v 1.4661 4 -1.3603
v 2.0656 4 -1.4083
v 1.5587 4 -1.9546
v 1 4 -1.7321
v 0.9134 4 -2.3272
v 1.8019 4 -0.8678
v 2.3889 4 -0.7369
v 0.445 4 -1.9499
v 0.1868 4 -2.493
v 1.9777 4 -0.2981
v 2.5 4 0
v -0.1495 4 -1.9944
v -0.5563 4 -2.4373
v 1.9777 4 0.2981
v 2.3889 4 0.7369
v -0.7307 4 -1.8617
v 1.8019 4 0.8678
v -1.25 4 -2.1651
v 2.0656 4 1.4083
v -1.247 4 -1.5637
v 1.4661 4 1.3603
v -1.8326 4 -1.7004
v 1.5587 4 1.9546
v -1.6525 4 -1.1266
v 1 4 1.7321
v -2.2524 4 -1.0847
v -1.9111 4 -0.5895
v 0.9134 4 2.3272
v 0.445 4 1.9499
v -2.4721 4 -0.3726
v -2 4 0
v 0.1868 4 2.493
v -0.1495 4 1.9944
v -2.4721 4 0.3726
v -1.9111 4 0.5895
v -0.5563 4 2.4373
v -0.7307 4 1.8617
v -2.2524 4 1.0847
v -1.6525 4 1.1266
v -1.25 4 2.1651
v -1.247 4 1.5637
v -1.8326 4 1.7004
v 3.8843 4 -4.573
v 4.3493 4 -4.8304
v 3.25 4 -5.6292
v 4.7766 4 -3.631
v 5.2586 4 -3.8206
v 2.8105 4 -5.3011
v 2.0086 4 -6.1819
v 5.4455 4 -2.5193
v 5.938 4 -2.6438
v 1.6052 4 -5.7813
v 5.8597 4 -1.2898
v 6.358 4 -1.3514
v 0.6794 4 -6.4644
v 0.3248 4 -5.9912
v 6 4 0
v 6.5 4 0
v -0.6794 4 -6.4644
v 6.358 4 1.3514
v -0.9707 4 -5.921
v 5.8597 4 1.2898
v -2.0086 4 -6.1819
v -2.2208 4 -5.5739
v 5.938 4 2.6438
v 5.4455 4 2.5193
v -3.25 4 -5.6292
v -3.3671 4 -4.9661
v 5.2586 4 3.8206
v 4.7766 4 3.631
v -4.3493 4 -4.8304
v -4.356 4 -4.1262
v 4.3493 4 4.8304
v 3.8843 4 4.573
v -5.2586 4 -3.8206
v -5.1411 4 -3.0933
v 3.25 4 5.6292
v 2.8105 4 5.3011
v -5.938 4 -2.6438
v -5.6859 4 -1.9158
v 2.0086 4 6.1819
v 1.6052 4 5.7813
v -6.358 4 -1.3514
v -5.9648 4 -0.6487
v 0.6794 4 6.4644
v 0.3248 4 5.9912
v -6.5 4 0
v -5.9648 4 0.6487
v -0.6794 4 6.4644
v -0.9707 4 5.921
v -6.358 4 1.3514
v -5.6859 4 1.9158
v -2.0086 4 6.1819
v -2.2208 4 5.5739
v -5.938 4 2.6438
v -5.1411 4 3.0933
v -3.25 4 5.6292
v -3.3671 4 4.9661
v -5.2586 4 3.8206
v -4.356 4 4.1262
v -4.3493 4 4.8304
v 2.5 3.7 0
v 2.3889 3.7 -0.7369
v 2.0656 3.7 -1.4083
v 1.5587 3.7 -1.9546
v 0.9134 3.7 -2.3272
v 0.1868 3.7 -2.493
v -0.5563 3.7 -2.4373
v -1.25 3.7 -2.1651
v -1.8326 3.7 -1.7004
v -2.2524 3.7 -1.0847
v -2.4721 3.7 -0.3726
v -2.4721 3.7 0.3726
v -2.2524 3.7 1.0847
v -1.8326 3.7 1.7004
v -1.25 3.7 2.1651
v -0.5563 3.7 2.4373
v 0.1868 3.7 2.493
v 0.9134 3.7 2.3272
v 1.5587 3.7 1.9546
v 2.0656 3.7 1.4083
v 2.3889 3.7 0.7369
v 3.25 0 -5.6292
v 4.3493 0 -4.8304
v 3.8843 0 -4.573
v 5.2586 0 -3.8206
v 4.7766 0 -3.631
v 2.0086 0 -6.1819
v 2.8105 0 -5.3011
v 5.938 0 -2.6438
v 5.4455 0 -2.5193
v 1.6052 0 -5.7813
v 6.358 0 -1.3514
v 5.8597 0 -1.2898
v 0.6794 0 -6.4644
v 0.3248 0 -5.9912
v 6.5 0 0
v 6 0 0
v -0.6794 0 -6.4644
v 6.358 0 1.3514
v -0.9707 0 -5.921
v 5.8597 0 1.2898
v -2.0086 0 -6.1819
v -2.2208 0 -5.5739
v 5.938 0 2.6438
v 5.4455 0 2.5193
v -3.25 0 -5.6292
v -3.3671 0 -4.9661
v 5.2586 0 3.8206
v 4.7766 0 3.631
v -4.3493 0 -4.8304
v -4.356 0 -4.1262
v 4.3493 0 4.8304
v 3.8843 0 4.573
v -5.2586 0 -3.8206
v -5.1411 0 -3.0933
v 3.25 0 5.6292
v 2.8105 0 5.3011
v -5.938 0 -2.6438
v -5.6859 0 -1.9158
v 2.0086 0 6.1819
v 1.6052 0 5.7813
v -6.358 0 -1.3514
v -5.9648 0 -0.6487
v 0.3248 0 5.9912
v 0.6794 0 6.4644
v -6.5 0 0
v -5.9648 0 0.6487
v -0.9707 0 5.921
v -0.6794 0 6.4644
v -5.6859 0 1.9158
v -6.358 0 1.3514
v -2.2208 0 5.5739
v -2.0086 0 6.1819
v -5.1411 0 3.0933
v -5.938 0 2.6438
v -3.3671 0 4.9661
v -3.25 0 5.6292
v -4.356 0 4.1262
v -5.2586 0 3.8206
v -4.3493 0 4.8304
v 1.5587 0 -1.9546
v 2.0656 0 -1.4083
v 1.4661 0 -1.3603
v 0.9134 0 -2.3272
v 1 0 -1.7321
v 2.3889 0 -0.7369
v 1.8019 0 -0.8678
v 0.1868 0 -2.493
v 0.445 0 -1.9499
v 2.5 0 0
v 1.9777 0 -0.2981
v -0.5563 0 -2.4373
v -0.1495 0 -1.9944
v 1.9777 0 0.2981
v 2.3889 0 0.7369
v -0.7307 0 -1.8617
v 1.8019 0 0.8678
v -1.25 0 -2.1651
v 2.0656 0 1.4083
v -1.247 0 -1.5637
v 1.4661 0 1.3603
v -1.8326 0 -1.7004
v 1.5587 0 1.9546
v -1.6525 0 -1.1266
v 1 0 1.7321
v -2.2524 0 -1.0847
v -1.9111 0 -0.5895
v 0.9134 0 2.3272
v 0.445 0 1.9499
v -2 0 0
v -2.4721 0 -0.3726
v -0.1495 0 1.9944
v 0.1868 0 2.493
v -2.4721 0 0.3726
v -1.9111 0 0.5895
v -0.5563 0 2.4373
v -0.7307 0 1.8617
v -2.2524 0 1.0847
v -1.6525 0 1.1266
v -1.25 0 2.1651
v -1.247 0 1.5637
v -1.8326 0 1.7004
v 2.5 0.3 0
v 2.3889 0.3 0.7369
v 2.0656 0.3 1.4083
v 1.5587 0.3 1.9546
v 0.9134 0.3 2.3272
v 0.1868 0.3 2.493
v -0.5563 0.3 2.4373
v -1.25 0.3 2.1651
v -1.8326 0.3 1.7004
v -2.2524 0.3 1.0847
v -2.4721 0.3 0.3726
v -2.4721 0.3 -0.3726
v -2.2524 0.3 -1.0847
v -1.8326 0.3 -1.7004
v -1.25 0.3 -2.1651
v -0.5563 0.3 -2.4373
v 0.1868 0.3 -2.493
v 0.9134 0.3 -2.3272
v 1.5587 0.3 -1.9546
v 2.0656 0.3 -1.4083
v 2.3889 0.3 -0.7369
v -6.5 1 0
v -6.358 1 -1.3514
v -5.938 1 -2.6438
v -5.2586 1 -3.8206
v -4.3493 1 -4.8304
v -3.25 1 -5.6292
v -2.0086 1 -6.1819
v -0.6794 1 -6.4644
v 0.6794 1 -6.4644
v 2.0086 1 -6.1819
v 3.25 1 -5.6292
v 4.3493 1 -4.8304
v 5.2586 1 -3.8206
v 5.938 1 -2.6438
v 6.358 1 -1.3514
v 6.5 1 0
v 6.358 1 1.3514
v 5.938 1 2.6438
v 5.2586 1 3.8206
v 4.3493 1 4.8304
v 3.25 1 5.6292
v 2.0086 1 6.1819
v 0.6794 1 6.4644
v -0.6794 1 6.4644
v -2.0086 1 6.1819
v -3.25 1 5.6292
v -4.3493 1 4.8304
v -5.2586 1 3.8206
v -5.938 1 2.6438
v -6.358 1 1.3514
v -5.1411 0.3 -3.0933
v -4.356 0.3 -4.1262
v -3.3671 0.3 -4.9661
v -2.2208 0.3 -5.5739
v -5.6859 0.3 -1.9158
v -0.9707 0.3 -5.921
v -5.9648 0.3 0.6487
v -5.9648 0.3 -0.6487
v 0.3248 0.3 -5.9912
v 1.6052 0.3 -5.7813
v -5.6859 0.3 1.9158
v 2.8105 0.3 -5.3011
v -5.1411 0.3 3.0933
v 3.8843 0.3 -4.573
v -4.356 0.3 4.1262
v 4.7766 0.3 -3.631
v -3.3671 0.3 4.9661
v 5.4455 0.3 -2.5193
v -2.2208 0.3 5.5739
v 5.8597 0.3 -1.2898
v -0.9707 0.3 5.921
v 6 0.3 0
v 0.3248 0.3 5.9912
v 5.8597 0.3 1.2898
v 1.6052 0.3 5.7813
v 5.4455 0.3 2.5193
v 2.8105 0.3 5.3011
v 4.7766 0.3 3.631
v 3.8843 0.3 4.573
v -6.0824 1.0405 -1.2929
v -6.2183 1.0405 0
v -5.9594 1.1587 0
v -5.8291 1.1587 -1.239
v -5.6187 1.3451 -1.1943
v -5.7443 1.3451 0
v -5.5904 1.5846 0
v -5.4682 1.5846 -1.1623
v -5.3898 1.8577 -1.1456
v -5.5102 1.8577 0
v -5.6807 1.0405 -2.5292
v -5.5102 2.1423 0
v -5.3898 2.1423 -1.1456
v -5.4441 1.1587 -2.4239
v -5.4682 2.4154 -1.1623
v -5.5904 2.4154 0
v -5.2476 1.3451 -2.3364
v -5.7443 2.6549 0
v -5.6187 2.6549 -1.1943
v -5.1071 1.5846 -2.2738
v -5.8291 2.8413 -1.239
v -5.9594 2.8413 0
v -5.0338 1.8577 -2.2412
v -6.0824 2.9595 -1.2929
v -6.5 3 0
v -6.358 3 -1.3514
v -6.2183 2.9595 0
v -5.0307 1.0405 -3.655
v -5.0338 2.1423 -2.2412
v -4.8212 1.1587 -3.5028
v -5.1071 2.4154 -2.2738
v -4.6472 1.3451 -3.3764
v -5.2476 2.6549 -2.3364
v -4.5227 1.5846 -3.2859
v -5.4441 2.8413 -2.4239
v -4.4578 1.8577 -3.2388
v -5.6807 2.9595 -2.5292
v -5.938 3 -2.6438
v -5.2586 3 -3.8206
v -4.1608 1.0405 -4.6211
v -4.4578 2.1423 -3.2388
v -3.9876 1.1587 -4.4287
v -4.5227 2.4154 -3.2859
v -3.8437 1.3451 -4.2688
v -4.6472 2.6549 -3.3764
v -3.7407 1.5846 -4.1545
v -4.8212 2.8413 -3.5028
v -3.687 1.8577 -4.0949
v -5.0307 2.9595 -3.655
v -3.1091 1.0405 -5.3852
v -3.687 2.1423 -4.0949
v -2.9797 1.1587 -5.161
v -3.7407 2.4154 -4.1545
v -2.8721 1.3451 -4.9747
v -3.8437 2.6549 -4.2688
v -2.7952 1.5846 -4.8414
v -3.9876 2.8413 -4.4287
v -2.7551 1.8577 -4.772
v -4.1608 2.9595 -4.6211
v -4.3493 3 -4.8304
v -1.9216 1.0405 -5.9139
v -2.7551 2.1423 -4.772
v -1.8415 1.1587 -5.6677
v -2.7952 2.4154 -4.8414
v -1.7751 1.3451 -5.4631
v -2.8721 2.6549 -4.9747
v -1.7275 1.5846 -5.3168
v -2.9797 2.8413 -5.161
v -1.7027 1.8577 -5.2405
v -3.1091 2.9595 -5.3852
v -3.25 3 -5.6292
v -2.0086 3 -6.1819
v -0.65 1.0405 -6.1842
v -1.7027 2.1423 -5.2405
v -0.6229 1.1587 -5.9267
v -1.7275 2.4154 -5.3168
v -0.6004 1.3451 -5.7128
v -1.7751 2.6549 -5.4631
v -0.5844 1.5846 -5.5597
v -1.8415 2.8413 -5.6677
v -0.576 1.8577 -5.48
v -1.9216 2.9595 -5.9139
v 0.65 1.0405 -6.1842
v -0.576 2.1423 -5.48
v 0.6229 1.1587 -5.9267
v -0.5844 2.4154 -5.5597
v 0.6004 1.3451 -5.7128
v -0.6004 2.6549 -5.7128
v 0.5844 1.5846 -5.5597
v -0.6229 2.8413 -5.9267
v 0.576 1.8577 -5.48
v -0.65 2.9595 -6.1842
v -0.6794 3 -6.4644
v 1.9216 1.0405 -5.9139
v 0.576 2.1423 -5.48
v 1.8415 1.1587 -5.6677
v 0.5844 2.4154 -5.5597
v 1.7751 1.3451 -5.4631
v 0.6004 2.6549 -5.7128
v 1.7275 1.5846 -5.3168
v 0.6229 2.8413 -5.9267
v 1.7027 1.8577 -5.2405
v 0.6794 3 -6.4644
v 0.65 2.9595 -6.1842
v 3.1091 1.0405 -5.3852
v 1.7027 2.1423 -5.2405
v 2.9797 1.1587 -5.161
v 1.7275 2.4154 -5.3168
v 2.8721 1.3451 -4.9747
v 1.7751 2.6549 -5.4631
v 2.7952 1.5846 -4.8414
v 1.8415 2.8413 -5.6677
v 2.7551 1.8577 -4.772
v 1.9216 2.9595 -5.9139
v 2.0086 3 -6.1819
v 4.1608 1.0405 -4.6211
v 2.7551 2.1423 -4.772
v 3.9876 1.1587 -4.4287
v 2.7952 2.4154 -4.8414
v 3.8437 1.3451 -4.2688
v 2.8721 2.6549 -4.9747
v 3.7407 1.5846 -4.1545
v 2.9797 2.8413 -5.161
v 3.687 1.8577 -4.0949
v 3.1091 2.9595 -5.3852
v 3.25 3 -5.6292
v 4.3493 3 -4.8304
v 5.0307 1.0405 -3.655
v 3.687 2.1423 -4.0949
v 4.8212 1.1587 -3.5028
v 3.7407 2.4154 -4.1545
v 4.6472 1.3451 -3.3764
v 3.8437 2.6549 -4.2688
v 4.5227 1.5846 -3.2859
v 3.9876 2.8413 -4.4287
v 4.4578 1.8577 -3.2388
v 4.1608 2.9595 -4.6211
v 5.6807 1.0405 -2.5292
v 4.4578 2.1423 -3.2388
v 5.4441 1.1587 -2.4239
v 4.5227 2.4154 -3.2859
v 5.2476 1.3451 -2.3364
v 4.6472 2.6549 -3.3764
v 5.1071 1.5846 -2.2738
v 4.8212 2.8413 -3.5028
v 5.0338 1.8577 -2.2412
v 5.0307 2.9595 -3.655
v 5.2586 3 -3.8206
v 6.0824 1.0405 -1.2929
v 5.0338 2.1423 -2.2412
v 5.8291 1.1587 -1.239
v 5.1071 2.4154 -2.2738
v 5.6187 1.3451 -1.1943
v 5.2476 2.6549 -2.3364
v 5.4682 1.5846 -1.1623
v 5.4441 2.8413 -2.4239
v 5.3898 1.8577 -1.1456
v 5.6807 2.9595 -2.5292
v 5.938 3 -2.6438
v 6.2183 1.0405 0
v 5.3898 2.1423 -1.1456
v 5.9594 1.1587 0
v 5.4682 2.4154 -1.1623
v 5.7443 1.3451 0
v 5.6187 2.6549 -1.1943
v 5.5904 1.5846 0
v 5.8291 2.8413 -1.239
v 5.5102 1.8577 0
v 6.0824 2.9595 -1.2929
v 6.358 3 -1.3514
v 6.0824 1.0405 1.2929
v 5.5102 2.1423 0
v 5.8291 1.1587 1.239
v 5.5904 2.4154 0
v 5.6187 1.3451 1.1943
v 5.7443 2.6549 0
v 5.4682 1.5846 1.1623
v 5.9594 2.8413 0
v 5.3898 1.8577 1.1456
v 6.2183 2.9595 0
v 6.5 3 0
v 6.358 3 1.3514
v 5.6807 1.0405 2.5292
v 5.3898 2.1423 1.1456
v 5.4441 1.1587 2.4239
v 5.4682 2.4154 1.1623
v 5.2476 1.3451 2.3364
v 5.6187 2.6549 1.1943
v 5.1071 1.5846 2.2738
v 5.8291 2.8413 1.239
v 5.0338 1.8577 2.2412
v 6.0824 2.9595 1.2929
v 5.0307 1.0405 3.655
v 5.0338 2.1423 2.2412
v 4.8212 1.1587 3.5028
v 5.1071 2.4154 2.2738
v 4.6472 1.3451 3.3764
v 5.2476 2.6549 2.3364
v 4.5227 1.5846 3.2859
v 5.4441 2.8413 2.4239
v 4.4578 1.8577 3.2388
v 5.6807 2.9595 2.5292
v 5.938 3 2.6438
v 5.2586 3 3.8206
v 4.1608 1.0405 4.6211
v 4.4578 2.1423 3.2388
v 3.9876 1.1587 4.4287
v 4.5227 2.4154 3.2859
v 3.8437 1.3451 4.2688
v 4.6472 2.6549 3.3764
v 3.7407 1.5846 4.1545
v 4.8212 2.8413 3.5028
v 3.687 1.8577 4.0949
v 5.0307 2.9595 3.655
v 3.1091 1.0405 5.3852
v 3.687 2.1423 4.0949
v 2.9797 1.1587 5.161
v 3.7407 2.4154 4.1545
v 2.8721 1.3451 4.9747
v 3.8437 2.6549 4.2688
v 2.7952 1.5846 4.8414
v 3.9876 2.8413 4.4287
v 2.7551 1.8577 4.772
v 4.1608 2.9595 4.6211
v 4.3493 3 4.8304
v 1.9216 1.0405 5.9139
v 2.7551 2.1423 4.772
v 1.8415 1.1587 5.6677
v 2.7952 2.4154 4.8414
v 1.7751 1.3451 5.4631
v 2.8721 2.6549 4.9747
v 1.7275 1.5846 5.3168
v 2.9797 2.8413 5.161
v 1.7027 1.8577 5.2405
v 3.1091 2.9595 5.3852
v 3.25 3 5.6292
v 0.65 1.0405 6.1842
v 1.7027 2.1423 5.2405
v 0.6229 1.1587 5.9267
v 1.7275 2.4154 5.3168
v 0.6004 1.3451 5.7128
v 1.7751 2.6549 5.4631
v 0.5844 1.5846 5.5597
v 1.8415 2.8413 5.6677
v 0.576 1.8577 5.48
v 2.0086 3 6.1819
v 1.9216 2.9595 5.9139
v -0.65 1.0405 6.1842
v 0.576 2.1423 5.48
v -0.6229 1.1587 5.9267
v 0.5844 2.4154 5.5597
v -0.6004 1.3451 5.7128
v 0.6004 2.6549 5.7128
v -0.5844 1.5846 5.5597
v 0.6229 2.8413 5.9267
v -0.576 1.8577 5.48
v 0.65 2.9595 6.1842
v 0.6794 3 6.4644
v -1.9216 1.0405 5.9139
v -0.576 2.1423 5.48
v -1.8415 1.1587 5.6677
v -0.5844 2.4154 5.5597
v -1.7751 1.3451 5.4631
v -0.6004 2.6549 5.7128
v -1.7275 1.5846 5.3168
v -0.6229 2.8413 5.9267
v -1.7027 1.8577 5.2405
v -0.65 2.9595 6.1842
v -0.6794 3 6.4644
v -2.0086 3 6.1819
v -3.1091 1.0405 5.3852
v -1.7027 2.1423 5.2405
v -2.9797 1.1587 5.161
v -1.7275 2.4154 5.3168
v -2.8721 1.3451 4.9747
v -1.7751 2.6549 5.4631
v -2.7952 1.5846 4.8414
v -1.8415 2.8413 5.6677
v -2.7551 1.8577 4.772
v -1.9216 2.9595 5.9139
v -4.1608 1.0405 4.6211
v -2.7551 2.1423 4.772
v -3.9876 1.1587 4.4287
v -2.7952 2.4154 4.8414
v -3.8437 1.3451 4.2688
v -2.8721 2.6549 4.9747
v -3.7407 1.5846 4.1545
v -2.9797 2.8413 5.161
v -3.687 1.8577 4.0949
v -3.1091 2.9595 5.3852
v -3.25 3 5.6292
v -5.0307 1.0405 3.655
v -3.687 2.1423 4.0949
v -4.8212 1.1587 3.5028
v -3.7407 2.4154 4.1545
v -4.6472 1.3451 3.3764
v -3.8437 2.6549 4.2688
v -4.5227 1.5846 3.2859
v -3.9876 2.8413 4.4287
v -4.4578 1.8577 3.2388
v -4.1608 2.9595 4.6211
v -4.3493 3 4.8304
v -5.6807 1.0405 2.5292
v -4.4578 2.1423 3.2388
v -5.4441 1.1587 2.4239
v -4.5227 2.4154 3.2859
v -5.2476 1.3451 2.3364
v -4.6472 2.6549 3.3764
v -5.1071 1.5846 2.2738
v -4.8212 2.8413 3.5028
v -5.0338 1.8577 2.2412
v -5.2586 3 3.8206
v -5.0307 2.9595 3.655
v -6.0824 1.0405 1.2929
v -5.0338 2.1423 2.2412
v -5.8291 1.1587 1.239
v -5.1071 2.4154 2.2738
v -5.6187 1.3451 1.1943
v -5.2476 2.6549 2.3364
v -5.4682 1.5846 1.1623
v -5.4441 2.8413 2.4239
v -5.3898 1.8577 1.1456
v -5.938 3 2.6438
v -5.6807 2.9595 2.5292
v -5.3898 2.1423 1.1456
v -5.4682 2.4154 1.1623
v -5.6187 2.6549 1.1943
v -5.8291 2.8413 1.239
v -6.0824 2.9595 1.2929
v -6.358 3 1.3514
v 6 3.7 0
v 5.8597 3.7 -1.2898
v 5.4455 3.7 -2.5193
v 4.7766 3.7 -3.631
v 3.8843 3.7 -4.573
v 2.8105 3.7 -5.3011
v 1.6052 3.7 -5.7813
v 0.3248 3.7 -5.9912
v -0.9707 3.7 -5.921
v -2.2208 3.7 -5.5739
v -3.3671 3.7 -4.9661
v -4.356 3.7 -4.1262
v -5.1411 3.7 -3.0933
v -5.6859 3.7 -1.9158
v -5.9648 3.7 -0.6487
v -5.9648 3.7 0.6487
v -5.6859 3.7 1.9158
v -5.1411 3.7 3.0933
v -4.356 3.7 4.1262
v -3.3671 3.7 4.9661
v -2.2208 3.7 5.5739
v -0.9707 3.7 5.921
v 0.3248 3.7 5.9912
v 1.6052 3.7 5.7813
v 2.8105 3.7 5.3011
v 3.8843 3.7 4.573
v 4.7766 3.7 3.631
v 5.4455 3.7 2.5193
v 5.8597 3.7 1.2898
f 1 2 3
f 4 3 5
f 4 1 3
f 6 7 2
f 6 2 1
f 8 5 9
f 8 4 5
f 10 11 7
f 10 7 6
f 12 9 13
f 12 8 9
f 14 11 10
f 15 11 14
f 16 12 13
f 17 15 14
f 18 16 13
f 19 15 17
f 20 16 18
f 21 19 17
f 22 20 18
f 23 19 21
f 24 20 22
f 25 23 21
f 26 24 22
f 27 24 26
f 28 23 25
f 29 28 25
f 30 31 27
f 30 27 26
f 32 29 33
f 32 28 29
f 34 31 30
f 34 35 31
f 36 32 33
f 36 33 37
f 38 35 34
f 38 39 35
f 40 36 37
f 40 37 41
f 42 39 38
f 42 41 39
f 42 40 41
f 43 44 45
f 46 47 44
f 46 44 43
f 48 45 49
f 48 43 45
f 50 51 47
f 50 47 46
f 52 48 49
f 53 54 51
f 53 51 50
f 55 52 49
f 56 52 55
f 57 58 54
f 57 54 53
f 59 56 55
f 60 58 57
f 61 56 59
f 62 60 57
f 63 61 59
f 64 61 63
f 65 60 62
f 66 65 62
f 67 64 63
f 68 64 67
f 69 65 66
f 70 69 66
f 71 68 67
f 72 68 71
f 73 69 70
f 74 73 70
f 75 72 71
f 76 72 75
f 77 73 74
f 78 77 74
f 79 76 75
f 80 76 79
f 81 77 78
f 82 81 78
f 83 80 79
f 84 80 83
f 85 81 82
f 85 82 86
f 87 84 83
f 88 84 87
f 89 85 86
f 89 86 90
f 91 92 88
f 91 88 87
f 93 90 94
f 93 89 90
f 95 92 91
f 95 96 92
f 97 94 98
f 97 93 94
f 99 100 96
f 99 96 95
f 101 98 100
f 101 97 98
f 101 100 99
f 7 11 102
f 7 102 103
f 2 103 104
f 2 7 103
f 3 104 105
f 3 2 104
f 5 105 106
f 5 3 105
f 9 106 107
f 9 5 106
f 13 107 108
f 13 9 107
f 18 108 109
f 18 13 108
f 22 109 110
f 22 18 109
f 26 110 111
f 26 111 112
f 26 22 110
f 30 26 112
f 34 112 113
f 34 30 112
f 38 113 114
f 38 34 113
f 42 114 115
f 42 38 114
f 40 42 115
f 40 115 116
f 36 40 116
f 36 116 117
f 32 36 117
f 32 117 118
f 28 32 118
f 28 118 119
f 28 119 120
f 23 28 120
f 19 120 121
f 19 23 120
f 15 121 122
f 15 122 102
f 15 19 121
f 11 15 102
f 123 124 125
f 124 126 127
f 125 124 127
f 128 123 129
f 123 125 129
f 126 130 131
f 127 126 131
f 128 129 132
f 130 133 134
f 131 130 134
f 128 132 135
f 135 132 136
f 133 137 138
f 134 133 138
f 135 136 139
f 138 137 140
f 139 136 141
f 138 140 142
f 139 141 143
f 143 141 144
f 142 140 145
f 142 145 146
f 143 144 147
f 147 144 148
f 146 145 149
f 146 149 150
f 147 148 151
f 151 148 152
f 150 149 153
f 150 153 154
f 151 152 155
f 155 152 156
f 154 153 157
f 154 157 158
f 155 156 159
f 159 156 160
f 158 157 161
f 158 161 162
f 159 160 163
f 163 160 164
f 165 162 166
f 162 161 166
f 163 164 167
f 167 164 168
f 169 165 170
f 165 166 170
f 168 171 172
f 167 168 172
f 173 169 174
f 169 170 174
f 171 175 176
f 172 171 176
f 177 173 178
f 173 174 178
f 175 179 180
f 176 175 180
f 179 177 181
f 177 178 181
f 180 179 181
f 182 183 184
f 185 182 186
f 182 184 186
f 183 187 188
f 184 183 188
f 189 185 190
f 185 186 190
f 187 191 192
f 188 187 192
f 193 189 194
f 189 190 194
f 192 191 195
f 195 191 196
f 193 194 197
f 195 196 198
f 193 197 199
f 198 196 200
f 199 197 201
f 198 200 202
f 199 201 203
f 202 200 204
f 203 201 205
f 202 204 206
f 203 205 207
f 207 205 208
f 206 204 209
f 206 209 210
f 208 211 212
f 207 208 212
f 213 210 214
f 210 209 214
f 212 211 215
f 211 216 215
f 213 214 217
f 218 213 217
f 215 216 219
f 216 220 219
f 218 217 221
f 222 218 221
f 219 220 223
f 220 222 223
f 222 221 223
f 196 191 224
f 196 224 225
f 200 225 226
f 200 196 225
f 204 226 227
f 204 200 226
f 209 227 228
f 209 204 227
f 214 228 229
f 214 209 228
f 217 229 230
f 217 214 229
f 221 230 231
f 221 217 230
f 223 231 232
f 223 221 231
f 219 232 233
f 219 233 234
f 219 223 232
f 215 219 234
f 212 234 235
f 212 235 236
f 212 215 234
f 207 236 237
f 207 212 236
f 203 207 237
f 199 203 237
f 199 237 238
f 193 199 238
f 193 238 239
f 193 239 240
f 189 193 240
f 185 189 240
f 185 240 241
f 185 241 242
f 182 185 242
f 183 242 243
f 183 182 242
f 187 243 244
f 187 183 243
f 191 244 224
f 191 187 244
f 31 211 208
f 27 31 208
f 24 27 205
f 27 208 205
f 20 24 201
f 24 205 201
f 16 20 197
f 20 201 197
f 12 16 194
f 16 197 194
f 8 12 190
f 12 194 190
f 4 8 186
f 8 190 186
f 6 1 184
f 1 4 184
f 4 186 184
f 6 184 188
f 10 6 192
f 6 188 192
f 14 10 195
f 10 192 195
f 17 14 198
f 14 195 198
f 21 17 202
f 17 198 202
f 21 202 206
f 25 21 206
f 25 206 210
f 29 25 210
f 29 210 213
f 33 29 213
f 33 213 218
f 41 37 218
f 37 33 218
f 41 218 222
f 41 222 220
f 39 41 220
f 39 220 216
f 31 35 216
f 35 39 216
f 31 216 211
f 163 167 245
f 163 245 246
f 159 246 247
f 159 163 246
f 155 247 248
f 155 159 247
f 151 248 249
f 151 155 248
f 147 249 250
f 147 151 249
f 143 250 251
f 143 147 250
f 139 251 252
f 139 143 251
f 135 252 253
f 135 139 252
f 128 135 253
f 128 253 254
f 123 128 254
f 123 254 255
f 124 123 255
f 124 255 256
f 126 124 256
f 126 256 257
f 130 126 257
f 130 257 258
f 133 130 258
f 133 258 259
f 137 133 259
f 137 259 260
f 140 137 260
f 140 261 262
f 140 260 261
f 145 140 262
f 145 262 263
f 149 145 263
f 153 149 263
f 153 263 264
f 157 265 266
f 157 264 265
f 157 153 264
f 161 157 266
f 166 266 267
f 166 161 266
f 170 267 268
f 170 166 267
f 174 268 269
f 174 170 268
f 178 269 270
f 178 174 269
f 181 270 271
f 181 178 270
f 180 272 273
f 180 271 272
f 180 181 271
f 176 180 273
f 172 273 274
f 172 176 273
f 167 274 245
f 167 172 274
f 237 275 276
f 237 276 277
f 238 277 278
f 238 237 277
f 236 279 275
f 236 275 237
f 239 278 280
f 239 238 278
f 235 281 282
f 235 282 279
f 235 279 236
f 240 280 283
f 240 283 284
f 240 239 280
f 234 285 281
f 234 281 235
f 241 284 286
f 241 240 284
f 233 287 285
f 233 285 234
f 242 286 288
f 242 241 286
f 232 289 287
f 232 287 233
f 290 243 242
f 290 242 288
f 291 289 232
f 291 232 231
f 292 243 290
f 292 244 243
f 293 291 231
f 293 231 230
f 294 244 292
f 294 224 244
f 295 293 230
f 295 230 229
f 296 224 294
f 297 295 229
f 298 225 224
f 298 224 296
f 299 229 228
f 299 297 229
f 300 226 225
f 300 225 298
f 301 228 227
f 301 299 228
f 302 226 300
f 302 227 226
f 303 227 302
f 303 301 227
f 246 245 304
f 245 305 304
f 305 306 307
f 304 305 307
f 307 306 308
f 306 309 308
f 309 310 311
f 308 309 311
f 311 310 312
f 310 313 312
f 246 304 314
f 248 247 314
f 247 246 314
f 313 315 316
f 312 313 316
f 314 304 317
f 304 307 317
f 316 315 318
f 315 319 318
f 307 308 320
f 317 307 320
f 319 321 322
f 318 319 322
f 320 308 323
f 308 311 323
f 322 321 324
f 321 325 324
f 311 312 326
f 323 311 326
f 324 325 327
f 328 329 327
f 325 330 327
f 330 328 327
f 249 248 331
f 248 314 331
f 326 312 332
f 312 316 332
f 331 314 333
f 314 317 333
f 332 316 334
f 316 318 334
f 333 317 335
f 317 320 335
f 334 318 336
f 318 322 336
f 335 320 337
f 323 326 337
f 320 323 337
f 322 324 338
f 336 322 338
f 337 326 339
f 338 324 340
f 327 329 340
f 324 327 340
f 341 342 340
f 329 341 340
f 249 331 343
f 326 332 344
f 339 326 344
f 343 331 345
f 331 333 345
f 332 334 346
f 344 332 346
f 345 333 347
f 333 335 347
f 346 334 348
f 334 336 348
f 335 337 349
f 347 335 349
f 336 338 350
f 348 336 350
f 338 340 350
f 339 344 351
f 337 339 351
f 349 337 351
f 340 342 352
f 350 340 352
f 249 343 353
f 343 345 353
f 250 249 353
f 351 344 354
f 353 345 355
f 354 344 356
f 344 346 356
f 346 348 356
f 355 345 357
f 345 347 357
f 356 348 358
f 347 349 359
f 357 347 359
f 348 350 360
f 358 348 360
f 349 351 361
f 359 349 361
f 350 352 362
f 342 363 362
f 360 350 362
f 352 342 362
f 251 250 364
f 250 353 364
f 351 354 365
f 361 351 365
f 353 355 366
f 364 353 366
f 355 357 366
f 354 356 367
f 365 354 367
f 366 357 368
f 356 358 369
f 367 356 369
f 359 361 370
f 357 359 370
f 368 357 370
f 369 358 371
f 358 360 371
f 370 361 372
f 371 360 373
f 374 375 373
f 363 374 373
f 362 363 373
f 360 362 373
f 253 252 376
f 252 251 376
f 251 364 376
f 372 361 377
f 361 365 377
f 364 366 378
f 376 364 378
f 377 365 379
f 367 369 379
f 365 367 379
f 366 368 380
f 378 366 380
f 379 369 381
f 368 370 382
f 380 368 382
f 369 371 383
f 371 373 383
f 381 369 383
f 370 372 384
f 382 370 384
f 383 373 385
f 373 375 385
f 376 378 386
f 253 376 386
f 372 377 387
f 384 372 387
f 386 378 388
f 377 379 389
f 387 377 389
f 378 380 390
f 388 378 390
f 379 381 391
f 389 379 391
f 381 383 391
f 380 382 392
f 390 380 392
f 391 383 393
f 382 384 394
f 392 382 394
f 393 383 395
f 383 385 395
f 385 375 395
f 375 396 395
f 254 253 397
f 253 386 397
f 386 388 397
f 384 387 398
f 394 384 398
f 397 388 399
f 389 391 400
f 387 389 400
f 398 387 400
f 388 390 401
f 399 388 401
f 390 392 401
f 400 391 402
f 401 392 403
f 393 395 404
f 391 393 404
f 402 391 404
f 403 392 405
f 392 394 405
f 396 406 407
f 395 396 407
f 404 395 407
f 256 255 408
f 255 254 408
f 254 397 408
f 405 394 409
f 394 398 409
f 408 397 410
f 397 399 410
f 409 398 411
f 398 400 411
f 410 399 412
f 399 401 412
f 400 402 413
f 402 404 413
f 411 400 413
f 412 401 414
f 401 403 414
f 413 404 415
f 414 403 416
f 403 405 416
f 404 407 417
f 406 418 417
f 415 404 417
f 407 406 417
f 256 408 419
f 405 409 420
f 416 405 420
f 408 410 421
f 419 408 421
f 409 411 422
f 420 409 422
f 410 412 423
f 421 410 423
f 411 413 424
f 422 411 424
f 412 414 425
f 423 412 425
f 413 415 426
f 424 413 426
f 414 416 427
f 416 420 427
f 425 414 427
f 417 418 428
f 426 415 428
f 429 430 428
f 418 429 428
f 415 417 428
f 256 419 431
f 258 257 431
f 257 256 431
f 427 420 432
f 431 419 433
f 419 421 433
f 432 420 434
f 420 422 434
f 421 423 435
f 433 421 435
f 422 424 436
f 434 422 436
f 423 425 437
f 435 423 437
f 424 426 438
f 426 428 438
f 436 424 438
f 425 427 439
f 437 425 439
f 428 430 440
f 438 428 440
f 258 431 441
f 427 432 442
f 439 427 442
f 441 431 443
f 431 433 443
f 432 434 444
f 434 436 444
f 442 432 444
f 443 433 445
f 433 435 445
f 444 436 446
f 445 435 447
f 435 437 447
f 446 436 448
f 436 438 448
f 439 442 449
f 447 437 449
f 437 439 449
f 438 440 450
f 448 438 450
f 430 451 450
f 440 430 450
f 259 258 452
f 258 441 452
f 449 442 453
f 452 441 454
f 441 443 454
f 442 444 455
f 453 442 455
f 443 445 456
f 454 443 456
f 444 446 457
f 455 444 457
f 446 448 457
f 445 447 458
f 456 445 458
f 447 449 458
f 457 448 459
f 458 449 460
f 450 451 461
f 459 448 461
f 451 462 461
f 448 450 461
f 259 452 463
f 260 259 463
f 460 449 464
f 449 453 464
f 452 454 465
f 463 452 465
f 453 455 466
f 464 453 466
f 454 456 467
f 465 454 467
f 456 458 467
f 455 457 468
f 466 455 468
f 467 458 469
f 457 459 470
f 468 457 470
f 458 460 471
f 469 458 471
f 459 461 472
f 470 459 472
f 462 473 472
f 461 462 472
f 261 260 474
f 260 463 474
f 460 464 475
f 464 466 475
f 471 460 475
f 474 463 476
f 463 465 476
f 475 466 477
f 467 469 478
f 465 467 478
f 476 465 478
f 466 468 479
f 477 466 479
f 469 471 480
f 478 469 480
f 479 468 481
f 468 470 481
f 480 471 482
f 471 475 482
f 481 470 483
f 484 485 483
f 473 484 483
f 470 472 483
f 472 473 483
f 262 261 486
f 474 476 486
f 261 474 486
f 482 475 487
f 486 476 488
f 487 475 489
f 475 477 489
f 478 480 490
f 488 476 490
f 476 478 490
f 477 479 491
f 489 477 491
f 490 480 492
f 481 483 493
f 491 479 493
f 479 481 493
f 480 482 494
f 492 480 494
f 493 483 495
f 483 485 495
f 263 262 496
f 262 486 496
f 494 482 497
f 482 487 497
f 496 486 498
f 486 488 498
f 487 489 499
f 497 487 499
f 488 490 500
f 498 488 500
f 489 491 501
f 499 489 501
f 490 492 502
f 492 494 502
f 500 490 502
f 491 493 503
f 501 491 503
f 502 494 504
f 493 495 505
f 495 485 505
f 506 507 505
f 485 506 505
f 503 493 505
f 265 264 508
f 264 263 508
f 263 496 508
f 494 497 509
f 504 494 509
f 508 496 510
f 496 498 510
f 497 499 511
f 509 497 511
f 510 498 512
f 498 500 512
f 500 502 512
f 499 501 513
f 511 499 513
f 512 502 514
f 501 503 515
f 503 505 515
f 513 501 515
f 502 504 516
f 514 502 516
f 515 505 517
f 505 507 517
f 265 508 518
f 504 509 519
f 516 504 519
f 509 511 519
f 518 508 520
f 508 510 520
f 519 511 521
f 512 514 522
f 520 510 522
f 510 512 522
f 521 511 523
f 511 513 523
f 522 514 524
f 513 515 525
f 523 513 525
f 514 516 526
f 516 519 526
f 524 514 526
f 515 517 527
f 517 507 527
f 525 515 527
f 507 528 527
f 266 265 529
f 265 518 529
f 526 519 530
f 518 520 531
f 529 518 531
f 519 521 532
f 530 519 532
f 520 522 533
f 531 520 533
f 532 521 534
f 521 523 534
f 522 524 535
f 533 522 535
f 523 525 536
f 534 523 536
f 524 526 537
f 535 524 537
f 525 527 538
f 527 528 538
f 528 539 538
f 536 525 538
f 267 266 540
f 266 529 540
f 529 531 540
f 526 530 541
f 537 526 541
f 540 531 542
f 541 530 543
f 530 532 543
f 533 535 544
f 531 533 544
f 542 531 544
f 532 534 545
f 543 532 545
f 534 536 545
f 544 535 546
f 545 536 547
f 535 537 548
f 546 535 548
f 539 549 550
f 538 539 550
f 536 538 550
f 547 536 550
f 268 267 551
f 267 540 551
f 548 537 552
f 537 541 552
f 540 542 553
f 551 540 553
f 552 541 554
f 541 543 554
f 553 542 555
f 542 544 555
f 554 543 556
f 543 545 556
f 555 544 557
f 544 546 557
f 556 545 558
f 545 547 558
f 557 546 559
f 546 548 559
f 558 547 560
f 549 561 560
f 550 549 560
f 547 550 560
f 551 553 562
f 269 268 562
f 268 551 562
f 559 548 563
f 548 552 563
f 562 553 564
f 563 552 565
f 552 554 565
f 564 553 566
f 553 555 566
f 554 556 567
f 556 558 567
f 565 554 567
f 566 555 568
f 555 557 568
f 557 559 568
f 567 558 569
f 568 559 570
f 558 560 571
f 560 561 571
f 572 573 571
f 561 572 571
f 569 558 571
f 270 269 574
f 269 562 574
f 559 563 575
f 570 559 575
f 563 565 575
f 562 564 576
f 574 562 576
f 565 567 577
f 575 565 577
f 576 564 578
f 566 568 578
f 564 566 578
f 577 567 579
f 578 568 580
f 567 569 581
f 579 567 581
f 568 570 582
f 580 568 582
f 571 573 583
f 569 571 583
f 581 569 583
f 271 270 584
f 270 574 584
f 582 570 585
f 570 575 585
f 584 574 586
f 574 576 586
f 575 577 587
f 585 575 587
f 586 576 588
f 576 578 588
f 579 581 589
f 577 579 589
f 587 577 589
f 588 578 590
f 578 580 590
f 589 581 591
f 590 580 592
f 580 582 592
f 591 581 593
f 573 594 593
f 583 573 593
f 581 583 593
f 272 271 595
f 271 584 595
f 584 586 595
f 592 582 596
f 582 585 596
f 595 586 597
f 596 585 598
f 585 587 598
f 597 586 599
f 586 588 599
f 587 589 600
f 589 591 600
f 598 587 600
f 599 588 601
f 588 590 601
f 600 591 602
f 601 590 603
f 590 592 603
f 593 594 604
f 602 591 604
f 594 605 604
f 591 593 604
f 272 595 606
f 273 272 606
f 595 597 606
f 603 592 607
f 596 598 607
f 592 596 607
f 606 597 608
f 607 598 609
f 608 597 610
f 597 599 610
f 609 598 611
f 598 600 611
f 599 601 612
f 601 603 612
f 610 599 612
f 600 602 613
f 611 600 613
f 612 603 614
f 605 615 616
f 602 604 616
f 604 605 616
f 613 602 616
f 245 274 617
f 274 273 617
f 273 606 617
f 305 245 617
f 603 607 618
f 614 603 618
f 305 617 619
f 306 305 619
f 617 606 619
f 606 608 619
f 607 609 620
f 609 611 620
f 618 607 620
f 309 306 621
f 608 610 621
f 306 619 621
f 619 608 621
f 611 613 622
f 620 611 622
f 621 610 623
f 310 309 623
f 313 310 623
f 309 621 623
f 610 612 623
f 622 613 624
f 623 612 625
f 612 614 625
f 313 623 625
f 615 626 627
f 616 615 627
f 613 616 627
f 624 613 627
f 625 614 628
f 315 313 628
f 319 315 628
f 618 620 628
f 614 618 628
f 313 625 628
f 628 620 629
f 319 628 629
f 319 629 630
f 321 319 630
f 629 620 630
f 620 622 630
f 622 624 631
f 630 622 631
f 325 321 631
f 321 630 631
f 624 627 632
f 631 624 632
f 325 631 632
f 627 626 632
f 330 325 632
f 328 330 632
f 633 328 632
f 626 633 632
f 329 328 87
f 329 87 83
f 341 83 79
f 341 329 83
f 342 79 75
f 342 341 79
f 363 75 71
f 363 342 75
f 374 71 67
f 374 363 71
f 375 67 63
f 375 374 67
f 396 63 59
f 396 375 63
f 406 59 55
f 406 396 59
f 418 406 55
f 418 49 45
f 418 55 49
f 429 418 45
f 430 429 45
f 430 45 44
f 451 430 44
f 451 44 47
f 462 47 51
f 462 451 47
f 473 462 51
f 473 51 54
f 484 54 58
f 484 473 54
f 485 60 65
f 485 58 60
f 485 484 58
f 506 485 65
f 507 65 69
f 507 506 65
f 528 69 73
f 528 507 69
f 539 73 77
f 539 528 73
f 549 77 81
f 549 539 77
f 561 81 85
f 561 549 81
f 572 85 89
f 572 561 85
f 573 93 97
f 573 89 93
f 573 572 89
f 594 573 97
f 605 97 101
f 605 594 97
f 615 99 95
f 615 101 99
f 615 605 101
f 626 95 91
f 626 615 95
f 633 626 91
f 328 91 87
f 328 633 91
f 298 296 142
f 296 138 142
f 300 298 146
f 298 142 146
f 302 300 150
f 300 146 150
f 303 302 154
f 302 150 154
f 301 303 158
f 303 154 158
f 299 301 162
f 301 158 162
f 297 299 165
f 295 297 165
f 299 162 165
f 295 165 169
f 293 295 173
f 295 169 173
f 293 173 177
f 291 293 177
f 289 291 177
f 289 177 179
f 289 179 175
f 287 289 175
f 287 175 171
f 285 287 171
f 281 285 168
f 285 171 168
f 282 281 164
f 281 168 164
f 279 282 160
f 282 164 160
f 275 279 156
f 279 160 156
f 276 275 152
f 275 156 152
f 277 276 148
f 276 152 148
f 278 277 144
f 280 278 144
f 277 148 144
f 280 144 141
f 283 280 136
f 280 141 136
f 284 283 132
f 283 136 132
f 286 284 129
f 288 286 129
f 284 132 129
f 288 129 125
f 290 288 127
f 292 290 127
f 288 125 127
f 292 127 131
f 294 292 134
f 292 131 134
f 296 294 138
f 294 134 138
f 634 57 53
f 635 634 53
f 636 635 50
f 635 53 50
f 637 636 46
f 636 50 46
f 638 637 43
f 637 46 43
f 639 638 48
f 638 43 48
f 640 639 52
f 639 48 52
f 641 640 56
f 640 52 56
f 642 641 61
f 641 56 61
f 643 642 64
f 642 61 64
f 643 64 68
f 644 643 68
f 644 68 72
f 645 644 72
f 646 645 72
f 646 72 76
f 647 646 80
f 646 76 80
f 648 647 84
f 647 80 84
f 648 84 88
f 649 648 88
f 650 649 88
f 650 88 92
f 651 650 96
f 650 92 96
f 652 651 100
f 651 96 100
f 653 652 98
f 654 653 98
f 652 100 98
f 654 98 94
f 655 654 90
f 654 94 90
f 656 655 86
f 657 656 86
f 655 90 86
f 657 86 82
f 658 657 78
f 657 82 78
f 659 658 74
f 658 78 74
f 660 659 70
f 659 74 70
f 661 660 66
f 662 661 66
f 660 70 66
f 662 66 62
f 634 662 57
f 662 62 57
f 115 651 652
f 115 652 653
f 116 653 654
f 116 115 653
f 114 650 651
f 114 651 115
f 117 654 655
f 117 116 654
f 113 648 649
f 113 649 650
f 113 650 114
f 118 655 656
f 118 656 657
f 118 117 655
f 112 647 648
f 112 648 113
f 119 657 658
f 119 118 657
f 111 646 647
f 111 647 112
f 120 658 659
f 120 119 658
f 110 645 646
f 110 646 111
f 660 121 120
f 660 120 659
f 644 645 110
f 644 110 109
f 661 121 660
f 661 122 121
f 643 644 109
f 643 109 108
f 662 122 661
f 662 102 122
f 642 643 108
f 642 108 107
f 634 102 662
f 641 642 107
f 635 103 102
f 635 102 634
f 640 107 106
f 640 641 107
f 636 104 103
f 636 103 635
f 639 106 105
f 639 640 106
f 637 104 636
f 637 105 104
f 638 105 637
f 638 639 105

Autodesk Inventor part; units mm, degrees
ref_plane "YZ Plane" through (0, 0, 0) normal (1, 0, 0) x (0, 1, 0)
sketch "Эскиз1" plane through (0, 0, 0) normal (0, 1, 0) x (-1, 0, 0)
  circle A0 centre (0, 0) radius 2
  circle A1 centre (0, 0) radius 6.5
  dimension "d1" = 4
  dimension "d2" = 13
extrude "Выдавливание1" add sketch "Эскиз1" along normal blind 4
sketch "Эскиз2" plane through (0, 4, 0) normal (0, 1, 0) x (1, 0, 0)
  circle A0 centre (0, 0) radius 2 projected
  circle A1 centre (0, 0) radius 2.5
  circle A2 centre (0, 0) radius 6
  dimension "d5" = 5
  dimension "d6" = 12
extrude "Выдавливание2" cut sketch "Эскиз2" against normal blind 0.3 contours A2
sketch "Эскиз3" plane through (0, 0, 0) normal (0, -1, 0) x (1, 0, 0)
  circle A0 centre (0, 0) radius 2.5
  circle A1 centre (0, 0) radius 6
  dimension "d9" = 5
  dimension "d10" = 12
extrude "Выдавливание3" cut sketch "Эскиз3" against normal blind 0.3
ref_plane "РабПлоскость1" through (0, 2, 0) normal (0, 1, 0) x (1, 0, 0)
sketch "Эскиз4" plane through (0, 2, 0) normal (0, 1, 0) x (1, 0, 0)
  circle A0 centre (0, 0) radius 6.5
  dimension "d13" = 13
ref_plane "РабПлоскость2" through (0, 0, 0) normal (0, 0, 1) x (1, 0, 0)
sketch "Эскиз6" plane through (0, 0, 0) normal (0, 0, 1) x (1, 0, 0)
  line L0 (-6.5, 0) -> (-6.5, 4) projected
  circle A0 centre (-6.5, 2) radius 1
  line L1 (0, -0.8) -> (0, 4.8) projected
  point P0 (0, 0)
  dimension "d15" = 2
revolve "Вращение1" cut sketch "Эскиз6" angle 360 about axis through (0, -10, 0) along (0, 1, 0)
properties part number "U-подшипник"
